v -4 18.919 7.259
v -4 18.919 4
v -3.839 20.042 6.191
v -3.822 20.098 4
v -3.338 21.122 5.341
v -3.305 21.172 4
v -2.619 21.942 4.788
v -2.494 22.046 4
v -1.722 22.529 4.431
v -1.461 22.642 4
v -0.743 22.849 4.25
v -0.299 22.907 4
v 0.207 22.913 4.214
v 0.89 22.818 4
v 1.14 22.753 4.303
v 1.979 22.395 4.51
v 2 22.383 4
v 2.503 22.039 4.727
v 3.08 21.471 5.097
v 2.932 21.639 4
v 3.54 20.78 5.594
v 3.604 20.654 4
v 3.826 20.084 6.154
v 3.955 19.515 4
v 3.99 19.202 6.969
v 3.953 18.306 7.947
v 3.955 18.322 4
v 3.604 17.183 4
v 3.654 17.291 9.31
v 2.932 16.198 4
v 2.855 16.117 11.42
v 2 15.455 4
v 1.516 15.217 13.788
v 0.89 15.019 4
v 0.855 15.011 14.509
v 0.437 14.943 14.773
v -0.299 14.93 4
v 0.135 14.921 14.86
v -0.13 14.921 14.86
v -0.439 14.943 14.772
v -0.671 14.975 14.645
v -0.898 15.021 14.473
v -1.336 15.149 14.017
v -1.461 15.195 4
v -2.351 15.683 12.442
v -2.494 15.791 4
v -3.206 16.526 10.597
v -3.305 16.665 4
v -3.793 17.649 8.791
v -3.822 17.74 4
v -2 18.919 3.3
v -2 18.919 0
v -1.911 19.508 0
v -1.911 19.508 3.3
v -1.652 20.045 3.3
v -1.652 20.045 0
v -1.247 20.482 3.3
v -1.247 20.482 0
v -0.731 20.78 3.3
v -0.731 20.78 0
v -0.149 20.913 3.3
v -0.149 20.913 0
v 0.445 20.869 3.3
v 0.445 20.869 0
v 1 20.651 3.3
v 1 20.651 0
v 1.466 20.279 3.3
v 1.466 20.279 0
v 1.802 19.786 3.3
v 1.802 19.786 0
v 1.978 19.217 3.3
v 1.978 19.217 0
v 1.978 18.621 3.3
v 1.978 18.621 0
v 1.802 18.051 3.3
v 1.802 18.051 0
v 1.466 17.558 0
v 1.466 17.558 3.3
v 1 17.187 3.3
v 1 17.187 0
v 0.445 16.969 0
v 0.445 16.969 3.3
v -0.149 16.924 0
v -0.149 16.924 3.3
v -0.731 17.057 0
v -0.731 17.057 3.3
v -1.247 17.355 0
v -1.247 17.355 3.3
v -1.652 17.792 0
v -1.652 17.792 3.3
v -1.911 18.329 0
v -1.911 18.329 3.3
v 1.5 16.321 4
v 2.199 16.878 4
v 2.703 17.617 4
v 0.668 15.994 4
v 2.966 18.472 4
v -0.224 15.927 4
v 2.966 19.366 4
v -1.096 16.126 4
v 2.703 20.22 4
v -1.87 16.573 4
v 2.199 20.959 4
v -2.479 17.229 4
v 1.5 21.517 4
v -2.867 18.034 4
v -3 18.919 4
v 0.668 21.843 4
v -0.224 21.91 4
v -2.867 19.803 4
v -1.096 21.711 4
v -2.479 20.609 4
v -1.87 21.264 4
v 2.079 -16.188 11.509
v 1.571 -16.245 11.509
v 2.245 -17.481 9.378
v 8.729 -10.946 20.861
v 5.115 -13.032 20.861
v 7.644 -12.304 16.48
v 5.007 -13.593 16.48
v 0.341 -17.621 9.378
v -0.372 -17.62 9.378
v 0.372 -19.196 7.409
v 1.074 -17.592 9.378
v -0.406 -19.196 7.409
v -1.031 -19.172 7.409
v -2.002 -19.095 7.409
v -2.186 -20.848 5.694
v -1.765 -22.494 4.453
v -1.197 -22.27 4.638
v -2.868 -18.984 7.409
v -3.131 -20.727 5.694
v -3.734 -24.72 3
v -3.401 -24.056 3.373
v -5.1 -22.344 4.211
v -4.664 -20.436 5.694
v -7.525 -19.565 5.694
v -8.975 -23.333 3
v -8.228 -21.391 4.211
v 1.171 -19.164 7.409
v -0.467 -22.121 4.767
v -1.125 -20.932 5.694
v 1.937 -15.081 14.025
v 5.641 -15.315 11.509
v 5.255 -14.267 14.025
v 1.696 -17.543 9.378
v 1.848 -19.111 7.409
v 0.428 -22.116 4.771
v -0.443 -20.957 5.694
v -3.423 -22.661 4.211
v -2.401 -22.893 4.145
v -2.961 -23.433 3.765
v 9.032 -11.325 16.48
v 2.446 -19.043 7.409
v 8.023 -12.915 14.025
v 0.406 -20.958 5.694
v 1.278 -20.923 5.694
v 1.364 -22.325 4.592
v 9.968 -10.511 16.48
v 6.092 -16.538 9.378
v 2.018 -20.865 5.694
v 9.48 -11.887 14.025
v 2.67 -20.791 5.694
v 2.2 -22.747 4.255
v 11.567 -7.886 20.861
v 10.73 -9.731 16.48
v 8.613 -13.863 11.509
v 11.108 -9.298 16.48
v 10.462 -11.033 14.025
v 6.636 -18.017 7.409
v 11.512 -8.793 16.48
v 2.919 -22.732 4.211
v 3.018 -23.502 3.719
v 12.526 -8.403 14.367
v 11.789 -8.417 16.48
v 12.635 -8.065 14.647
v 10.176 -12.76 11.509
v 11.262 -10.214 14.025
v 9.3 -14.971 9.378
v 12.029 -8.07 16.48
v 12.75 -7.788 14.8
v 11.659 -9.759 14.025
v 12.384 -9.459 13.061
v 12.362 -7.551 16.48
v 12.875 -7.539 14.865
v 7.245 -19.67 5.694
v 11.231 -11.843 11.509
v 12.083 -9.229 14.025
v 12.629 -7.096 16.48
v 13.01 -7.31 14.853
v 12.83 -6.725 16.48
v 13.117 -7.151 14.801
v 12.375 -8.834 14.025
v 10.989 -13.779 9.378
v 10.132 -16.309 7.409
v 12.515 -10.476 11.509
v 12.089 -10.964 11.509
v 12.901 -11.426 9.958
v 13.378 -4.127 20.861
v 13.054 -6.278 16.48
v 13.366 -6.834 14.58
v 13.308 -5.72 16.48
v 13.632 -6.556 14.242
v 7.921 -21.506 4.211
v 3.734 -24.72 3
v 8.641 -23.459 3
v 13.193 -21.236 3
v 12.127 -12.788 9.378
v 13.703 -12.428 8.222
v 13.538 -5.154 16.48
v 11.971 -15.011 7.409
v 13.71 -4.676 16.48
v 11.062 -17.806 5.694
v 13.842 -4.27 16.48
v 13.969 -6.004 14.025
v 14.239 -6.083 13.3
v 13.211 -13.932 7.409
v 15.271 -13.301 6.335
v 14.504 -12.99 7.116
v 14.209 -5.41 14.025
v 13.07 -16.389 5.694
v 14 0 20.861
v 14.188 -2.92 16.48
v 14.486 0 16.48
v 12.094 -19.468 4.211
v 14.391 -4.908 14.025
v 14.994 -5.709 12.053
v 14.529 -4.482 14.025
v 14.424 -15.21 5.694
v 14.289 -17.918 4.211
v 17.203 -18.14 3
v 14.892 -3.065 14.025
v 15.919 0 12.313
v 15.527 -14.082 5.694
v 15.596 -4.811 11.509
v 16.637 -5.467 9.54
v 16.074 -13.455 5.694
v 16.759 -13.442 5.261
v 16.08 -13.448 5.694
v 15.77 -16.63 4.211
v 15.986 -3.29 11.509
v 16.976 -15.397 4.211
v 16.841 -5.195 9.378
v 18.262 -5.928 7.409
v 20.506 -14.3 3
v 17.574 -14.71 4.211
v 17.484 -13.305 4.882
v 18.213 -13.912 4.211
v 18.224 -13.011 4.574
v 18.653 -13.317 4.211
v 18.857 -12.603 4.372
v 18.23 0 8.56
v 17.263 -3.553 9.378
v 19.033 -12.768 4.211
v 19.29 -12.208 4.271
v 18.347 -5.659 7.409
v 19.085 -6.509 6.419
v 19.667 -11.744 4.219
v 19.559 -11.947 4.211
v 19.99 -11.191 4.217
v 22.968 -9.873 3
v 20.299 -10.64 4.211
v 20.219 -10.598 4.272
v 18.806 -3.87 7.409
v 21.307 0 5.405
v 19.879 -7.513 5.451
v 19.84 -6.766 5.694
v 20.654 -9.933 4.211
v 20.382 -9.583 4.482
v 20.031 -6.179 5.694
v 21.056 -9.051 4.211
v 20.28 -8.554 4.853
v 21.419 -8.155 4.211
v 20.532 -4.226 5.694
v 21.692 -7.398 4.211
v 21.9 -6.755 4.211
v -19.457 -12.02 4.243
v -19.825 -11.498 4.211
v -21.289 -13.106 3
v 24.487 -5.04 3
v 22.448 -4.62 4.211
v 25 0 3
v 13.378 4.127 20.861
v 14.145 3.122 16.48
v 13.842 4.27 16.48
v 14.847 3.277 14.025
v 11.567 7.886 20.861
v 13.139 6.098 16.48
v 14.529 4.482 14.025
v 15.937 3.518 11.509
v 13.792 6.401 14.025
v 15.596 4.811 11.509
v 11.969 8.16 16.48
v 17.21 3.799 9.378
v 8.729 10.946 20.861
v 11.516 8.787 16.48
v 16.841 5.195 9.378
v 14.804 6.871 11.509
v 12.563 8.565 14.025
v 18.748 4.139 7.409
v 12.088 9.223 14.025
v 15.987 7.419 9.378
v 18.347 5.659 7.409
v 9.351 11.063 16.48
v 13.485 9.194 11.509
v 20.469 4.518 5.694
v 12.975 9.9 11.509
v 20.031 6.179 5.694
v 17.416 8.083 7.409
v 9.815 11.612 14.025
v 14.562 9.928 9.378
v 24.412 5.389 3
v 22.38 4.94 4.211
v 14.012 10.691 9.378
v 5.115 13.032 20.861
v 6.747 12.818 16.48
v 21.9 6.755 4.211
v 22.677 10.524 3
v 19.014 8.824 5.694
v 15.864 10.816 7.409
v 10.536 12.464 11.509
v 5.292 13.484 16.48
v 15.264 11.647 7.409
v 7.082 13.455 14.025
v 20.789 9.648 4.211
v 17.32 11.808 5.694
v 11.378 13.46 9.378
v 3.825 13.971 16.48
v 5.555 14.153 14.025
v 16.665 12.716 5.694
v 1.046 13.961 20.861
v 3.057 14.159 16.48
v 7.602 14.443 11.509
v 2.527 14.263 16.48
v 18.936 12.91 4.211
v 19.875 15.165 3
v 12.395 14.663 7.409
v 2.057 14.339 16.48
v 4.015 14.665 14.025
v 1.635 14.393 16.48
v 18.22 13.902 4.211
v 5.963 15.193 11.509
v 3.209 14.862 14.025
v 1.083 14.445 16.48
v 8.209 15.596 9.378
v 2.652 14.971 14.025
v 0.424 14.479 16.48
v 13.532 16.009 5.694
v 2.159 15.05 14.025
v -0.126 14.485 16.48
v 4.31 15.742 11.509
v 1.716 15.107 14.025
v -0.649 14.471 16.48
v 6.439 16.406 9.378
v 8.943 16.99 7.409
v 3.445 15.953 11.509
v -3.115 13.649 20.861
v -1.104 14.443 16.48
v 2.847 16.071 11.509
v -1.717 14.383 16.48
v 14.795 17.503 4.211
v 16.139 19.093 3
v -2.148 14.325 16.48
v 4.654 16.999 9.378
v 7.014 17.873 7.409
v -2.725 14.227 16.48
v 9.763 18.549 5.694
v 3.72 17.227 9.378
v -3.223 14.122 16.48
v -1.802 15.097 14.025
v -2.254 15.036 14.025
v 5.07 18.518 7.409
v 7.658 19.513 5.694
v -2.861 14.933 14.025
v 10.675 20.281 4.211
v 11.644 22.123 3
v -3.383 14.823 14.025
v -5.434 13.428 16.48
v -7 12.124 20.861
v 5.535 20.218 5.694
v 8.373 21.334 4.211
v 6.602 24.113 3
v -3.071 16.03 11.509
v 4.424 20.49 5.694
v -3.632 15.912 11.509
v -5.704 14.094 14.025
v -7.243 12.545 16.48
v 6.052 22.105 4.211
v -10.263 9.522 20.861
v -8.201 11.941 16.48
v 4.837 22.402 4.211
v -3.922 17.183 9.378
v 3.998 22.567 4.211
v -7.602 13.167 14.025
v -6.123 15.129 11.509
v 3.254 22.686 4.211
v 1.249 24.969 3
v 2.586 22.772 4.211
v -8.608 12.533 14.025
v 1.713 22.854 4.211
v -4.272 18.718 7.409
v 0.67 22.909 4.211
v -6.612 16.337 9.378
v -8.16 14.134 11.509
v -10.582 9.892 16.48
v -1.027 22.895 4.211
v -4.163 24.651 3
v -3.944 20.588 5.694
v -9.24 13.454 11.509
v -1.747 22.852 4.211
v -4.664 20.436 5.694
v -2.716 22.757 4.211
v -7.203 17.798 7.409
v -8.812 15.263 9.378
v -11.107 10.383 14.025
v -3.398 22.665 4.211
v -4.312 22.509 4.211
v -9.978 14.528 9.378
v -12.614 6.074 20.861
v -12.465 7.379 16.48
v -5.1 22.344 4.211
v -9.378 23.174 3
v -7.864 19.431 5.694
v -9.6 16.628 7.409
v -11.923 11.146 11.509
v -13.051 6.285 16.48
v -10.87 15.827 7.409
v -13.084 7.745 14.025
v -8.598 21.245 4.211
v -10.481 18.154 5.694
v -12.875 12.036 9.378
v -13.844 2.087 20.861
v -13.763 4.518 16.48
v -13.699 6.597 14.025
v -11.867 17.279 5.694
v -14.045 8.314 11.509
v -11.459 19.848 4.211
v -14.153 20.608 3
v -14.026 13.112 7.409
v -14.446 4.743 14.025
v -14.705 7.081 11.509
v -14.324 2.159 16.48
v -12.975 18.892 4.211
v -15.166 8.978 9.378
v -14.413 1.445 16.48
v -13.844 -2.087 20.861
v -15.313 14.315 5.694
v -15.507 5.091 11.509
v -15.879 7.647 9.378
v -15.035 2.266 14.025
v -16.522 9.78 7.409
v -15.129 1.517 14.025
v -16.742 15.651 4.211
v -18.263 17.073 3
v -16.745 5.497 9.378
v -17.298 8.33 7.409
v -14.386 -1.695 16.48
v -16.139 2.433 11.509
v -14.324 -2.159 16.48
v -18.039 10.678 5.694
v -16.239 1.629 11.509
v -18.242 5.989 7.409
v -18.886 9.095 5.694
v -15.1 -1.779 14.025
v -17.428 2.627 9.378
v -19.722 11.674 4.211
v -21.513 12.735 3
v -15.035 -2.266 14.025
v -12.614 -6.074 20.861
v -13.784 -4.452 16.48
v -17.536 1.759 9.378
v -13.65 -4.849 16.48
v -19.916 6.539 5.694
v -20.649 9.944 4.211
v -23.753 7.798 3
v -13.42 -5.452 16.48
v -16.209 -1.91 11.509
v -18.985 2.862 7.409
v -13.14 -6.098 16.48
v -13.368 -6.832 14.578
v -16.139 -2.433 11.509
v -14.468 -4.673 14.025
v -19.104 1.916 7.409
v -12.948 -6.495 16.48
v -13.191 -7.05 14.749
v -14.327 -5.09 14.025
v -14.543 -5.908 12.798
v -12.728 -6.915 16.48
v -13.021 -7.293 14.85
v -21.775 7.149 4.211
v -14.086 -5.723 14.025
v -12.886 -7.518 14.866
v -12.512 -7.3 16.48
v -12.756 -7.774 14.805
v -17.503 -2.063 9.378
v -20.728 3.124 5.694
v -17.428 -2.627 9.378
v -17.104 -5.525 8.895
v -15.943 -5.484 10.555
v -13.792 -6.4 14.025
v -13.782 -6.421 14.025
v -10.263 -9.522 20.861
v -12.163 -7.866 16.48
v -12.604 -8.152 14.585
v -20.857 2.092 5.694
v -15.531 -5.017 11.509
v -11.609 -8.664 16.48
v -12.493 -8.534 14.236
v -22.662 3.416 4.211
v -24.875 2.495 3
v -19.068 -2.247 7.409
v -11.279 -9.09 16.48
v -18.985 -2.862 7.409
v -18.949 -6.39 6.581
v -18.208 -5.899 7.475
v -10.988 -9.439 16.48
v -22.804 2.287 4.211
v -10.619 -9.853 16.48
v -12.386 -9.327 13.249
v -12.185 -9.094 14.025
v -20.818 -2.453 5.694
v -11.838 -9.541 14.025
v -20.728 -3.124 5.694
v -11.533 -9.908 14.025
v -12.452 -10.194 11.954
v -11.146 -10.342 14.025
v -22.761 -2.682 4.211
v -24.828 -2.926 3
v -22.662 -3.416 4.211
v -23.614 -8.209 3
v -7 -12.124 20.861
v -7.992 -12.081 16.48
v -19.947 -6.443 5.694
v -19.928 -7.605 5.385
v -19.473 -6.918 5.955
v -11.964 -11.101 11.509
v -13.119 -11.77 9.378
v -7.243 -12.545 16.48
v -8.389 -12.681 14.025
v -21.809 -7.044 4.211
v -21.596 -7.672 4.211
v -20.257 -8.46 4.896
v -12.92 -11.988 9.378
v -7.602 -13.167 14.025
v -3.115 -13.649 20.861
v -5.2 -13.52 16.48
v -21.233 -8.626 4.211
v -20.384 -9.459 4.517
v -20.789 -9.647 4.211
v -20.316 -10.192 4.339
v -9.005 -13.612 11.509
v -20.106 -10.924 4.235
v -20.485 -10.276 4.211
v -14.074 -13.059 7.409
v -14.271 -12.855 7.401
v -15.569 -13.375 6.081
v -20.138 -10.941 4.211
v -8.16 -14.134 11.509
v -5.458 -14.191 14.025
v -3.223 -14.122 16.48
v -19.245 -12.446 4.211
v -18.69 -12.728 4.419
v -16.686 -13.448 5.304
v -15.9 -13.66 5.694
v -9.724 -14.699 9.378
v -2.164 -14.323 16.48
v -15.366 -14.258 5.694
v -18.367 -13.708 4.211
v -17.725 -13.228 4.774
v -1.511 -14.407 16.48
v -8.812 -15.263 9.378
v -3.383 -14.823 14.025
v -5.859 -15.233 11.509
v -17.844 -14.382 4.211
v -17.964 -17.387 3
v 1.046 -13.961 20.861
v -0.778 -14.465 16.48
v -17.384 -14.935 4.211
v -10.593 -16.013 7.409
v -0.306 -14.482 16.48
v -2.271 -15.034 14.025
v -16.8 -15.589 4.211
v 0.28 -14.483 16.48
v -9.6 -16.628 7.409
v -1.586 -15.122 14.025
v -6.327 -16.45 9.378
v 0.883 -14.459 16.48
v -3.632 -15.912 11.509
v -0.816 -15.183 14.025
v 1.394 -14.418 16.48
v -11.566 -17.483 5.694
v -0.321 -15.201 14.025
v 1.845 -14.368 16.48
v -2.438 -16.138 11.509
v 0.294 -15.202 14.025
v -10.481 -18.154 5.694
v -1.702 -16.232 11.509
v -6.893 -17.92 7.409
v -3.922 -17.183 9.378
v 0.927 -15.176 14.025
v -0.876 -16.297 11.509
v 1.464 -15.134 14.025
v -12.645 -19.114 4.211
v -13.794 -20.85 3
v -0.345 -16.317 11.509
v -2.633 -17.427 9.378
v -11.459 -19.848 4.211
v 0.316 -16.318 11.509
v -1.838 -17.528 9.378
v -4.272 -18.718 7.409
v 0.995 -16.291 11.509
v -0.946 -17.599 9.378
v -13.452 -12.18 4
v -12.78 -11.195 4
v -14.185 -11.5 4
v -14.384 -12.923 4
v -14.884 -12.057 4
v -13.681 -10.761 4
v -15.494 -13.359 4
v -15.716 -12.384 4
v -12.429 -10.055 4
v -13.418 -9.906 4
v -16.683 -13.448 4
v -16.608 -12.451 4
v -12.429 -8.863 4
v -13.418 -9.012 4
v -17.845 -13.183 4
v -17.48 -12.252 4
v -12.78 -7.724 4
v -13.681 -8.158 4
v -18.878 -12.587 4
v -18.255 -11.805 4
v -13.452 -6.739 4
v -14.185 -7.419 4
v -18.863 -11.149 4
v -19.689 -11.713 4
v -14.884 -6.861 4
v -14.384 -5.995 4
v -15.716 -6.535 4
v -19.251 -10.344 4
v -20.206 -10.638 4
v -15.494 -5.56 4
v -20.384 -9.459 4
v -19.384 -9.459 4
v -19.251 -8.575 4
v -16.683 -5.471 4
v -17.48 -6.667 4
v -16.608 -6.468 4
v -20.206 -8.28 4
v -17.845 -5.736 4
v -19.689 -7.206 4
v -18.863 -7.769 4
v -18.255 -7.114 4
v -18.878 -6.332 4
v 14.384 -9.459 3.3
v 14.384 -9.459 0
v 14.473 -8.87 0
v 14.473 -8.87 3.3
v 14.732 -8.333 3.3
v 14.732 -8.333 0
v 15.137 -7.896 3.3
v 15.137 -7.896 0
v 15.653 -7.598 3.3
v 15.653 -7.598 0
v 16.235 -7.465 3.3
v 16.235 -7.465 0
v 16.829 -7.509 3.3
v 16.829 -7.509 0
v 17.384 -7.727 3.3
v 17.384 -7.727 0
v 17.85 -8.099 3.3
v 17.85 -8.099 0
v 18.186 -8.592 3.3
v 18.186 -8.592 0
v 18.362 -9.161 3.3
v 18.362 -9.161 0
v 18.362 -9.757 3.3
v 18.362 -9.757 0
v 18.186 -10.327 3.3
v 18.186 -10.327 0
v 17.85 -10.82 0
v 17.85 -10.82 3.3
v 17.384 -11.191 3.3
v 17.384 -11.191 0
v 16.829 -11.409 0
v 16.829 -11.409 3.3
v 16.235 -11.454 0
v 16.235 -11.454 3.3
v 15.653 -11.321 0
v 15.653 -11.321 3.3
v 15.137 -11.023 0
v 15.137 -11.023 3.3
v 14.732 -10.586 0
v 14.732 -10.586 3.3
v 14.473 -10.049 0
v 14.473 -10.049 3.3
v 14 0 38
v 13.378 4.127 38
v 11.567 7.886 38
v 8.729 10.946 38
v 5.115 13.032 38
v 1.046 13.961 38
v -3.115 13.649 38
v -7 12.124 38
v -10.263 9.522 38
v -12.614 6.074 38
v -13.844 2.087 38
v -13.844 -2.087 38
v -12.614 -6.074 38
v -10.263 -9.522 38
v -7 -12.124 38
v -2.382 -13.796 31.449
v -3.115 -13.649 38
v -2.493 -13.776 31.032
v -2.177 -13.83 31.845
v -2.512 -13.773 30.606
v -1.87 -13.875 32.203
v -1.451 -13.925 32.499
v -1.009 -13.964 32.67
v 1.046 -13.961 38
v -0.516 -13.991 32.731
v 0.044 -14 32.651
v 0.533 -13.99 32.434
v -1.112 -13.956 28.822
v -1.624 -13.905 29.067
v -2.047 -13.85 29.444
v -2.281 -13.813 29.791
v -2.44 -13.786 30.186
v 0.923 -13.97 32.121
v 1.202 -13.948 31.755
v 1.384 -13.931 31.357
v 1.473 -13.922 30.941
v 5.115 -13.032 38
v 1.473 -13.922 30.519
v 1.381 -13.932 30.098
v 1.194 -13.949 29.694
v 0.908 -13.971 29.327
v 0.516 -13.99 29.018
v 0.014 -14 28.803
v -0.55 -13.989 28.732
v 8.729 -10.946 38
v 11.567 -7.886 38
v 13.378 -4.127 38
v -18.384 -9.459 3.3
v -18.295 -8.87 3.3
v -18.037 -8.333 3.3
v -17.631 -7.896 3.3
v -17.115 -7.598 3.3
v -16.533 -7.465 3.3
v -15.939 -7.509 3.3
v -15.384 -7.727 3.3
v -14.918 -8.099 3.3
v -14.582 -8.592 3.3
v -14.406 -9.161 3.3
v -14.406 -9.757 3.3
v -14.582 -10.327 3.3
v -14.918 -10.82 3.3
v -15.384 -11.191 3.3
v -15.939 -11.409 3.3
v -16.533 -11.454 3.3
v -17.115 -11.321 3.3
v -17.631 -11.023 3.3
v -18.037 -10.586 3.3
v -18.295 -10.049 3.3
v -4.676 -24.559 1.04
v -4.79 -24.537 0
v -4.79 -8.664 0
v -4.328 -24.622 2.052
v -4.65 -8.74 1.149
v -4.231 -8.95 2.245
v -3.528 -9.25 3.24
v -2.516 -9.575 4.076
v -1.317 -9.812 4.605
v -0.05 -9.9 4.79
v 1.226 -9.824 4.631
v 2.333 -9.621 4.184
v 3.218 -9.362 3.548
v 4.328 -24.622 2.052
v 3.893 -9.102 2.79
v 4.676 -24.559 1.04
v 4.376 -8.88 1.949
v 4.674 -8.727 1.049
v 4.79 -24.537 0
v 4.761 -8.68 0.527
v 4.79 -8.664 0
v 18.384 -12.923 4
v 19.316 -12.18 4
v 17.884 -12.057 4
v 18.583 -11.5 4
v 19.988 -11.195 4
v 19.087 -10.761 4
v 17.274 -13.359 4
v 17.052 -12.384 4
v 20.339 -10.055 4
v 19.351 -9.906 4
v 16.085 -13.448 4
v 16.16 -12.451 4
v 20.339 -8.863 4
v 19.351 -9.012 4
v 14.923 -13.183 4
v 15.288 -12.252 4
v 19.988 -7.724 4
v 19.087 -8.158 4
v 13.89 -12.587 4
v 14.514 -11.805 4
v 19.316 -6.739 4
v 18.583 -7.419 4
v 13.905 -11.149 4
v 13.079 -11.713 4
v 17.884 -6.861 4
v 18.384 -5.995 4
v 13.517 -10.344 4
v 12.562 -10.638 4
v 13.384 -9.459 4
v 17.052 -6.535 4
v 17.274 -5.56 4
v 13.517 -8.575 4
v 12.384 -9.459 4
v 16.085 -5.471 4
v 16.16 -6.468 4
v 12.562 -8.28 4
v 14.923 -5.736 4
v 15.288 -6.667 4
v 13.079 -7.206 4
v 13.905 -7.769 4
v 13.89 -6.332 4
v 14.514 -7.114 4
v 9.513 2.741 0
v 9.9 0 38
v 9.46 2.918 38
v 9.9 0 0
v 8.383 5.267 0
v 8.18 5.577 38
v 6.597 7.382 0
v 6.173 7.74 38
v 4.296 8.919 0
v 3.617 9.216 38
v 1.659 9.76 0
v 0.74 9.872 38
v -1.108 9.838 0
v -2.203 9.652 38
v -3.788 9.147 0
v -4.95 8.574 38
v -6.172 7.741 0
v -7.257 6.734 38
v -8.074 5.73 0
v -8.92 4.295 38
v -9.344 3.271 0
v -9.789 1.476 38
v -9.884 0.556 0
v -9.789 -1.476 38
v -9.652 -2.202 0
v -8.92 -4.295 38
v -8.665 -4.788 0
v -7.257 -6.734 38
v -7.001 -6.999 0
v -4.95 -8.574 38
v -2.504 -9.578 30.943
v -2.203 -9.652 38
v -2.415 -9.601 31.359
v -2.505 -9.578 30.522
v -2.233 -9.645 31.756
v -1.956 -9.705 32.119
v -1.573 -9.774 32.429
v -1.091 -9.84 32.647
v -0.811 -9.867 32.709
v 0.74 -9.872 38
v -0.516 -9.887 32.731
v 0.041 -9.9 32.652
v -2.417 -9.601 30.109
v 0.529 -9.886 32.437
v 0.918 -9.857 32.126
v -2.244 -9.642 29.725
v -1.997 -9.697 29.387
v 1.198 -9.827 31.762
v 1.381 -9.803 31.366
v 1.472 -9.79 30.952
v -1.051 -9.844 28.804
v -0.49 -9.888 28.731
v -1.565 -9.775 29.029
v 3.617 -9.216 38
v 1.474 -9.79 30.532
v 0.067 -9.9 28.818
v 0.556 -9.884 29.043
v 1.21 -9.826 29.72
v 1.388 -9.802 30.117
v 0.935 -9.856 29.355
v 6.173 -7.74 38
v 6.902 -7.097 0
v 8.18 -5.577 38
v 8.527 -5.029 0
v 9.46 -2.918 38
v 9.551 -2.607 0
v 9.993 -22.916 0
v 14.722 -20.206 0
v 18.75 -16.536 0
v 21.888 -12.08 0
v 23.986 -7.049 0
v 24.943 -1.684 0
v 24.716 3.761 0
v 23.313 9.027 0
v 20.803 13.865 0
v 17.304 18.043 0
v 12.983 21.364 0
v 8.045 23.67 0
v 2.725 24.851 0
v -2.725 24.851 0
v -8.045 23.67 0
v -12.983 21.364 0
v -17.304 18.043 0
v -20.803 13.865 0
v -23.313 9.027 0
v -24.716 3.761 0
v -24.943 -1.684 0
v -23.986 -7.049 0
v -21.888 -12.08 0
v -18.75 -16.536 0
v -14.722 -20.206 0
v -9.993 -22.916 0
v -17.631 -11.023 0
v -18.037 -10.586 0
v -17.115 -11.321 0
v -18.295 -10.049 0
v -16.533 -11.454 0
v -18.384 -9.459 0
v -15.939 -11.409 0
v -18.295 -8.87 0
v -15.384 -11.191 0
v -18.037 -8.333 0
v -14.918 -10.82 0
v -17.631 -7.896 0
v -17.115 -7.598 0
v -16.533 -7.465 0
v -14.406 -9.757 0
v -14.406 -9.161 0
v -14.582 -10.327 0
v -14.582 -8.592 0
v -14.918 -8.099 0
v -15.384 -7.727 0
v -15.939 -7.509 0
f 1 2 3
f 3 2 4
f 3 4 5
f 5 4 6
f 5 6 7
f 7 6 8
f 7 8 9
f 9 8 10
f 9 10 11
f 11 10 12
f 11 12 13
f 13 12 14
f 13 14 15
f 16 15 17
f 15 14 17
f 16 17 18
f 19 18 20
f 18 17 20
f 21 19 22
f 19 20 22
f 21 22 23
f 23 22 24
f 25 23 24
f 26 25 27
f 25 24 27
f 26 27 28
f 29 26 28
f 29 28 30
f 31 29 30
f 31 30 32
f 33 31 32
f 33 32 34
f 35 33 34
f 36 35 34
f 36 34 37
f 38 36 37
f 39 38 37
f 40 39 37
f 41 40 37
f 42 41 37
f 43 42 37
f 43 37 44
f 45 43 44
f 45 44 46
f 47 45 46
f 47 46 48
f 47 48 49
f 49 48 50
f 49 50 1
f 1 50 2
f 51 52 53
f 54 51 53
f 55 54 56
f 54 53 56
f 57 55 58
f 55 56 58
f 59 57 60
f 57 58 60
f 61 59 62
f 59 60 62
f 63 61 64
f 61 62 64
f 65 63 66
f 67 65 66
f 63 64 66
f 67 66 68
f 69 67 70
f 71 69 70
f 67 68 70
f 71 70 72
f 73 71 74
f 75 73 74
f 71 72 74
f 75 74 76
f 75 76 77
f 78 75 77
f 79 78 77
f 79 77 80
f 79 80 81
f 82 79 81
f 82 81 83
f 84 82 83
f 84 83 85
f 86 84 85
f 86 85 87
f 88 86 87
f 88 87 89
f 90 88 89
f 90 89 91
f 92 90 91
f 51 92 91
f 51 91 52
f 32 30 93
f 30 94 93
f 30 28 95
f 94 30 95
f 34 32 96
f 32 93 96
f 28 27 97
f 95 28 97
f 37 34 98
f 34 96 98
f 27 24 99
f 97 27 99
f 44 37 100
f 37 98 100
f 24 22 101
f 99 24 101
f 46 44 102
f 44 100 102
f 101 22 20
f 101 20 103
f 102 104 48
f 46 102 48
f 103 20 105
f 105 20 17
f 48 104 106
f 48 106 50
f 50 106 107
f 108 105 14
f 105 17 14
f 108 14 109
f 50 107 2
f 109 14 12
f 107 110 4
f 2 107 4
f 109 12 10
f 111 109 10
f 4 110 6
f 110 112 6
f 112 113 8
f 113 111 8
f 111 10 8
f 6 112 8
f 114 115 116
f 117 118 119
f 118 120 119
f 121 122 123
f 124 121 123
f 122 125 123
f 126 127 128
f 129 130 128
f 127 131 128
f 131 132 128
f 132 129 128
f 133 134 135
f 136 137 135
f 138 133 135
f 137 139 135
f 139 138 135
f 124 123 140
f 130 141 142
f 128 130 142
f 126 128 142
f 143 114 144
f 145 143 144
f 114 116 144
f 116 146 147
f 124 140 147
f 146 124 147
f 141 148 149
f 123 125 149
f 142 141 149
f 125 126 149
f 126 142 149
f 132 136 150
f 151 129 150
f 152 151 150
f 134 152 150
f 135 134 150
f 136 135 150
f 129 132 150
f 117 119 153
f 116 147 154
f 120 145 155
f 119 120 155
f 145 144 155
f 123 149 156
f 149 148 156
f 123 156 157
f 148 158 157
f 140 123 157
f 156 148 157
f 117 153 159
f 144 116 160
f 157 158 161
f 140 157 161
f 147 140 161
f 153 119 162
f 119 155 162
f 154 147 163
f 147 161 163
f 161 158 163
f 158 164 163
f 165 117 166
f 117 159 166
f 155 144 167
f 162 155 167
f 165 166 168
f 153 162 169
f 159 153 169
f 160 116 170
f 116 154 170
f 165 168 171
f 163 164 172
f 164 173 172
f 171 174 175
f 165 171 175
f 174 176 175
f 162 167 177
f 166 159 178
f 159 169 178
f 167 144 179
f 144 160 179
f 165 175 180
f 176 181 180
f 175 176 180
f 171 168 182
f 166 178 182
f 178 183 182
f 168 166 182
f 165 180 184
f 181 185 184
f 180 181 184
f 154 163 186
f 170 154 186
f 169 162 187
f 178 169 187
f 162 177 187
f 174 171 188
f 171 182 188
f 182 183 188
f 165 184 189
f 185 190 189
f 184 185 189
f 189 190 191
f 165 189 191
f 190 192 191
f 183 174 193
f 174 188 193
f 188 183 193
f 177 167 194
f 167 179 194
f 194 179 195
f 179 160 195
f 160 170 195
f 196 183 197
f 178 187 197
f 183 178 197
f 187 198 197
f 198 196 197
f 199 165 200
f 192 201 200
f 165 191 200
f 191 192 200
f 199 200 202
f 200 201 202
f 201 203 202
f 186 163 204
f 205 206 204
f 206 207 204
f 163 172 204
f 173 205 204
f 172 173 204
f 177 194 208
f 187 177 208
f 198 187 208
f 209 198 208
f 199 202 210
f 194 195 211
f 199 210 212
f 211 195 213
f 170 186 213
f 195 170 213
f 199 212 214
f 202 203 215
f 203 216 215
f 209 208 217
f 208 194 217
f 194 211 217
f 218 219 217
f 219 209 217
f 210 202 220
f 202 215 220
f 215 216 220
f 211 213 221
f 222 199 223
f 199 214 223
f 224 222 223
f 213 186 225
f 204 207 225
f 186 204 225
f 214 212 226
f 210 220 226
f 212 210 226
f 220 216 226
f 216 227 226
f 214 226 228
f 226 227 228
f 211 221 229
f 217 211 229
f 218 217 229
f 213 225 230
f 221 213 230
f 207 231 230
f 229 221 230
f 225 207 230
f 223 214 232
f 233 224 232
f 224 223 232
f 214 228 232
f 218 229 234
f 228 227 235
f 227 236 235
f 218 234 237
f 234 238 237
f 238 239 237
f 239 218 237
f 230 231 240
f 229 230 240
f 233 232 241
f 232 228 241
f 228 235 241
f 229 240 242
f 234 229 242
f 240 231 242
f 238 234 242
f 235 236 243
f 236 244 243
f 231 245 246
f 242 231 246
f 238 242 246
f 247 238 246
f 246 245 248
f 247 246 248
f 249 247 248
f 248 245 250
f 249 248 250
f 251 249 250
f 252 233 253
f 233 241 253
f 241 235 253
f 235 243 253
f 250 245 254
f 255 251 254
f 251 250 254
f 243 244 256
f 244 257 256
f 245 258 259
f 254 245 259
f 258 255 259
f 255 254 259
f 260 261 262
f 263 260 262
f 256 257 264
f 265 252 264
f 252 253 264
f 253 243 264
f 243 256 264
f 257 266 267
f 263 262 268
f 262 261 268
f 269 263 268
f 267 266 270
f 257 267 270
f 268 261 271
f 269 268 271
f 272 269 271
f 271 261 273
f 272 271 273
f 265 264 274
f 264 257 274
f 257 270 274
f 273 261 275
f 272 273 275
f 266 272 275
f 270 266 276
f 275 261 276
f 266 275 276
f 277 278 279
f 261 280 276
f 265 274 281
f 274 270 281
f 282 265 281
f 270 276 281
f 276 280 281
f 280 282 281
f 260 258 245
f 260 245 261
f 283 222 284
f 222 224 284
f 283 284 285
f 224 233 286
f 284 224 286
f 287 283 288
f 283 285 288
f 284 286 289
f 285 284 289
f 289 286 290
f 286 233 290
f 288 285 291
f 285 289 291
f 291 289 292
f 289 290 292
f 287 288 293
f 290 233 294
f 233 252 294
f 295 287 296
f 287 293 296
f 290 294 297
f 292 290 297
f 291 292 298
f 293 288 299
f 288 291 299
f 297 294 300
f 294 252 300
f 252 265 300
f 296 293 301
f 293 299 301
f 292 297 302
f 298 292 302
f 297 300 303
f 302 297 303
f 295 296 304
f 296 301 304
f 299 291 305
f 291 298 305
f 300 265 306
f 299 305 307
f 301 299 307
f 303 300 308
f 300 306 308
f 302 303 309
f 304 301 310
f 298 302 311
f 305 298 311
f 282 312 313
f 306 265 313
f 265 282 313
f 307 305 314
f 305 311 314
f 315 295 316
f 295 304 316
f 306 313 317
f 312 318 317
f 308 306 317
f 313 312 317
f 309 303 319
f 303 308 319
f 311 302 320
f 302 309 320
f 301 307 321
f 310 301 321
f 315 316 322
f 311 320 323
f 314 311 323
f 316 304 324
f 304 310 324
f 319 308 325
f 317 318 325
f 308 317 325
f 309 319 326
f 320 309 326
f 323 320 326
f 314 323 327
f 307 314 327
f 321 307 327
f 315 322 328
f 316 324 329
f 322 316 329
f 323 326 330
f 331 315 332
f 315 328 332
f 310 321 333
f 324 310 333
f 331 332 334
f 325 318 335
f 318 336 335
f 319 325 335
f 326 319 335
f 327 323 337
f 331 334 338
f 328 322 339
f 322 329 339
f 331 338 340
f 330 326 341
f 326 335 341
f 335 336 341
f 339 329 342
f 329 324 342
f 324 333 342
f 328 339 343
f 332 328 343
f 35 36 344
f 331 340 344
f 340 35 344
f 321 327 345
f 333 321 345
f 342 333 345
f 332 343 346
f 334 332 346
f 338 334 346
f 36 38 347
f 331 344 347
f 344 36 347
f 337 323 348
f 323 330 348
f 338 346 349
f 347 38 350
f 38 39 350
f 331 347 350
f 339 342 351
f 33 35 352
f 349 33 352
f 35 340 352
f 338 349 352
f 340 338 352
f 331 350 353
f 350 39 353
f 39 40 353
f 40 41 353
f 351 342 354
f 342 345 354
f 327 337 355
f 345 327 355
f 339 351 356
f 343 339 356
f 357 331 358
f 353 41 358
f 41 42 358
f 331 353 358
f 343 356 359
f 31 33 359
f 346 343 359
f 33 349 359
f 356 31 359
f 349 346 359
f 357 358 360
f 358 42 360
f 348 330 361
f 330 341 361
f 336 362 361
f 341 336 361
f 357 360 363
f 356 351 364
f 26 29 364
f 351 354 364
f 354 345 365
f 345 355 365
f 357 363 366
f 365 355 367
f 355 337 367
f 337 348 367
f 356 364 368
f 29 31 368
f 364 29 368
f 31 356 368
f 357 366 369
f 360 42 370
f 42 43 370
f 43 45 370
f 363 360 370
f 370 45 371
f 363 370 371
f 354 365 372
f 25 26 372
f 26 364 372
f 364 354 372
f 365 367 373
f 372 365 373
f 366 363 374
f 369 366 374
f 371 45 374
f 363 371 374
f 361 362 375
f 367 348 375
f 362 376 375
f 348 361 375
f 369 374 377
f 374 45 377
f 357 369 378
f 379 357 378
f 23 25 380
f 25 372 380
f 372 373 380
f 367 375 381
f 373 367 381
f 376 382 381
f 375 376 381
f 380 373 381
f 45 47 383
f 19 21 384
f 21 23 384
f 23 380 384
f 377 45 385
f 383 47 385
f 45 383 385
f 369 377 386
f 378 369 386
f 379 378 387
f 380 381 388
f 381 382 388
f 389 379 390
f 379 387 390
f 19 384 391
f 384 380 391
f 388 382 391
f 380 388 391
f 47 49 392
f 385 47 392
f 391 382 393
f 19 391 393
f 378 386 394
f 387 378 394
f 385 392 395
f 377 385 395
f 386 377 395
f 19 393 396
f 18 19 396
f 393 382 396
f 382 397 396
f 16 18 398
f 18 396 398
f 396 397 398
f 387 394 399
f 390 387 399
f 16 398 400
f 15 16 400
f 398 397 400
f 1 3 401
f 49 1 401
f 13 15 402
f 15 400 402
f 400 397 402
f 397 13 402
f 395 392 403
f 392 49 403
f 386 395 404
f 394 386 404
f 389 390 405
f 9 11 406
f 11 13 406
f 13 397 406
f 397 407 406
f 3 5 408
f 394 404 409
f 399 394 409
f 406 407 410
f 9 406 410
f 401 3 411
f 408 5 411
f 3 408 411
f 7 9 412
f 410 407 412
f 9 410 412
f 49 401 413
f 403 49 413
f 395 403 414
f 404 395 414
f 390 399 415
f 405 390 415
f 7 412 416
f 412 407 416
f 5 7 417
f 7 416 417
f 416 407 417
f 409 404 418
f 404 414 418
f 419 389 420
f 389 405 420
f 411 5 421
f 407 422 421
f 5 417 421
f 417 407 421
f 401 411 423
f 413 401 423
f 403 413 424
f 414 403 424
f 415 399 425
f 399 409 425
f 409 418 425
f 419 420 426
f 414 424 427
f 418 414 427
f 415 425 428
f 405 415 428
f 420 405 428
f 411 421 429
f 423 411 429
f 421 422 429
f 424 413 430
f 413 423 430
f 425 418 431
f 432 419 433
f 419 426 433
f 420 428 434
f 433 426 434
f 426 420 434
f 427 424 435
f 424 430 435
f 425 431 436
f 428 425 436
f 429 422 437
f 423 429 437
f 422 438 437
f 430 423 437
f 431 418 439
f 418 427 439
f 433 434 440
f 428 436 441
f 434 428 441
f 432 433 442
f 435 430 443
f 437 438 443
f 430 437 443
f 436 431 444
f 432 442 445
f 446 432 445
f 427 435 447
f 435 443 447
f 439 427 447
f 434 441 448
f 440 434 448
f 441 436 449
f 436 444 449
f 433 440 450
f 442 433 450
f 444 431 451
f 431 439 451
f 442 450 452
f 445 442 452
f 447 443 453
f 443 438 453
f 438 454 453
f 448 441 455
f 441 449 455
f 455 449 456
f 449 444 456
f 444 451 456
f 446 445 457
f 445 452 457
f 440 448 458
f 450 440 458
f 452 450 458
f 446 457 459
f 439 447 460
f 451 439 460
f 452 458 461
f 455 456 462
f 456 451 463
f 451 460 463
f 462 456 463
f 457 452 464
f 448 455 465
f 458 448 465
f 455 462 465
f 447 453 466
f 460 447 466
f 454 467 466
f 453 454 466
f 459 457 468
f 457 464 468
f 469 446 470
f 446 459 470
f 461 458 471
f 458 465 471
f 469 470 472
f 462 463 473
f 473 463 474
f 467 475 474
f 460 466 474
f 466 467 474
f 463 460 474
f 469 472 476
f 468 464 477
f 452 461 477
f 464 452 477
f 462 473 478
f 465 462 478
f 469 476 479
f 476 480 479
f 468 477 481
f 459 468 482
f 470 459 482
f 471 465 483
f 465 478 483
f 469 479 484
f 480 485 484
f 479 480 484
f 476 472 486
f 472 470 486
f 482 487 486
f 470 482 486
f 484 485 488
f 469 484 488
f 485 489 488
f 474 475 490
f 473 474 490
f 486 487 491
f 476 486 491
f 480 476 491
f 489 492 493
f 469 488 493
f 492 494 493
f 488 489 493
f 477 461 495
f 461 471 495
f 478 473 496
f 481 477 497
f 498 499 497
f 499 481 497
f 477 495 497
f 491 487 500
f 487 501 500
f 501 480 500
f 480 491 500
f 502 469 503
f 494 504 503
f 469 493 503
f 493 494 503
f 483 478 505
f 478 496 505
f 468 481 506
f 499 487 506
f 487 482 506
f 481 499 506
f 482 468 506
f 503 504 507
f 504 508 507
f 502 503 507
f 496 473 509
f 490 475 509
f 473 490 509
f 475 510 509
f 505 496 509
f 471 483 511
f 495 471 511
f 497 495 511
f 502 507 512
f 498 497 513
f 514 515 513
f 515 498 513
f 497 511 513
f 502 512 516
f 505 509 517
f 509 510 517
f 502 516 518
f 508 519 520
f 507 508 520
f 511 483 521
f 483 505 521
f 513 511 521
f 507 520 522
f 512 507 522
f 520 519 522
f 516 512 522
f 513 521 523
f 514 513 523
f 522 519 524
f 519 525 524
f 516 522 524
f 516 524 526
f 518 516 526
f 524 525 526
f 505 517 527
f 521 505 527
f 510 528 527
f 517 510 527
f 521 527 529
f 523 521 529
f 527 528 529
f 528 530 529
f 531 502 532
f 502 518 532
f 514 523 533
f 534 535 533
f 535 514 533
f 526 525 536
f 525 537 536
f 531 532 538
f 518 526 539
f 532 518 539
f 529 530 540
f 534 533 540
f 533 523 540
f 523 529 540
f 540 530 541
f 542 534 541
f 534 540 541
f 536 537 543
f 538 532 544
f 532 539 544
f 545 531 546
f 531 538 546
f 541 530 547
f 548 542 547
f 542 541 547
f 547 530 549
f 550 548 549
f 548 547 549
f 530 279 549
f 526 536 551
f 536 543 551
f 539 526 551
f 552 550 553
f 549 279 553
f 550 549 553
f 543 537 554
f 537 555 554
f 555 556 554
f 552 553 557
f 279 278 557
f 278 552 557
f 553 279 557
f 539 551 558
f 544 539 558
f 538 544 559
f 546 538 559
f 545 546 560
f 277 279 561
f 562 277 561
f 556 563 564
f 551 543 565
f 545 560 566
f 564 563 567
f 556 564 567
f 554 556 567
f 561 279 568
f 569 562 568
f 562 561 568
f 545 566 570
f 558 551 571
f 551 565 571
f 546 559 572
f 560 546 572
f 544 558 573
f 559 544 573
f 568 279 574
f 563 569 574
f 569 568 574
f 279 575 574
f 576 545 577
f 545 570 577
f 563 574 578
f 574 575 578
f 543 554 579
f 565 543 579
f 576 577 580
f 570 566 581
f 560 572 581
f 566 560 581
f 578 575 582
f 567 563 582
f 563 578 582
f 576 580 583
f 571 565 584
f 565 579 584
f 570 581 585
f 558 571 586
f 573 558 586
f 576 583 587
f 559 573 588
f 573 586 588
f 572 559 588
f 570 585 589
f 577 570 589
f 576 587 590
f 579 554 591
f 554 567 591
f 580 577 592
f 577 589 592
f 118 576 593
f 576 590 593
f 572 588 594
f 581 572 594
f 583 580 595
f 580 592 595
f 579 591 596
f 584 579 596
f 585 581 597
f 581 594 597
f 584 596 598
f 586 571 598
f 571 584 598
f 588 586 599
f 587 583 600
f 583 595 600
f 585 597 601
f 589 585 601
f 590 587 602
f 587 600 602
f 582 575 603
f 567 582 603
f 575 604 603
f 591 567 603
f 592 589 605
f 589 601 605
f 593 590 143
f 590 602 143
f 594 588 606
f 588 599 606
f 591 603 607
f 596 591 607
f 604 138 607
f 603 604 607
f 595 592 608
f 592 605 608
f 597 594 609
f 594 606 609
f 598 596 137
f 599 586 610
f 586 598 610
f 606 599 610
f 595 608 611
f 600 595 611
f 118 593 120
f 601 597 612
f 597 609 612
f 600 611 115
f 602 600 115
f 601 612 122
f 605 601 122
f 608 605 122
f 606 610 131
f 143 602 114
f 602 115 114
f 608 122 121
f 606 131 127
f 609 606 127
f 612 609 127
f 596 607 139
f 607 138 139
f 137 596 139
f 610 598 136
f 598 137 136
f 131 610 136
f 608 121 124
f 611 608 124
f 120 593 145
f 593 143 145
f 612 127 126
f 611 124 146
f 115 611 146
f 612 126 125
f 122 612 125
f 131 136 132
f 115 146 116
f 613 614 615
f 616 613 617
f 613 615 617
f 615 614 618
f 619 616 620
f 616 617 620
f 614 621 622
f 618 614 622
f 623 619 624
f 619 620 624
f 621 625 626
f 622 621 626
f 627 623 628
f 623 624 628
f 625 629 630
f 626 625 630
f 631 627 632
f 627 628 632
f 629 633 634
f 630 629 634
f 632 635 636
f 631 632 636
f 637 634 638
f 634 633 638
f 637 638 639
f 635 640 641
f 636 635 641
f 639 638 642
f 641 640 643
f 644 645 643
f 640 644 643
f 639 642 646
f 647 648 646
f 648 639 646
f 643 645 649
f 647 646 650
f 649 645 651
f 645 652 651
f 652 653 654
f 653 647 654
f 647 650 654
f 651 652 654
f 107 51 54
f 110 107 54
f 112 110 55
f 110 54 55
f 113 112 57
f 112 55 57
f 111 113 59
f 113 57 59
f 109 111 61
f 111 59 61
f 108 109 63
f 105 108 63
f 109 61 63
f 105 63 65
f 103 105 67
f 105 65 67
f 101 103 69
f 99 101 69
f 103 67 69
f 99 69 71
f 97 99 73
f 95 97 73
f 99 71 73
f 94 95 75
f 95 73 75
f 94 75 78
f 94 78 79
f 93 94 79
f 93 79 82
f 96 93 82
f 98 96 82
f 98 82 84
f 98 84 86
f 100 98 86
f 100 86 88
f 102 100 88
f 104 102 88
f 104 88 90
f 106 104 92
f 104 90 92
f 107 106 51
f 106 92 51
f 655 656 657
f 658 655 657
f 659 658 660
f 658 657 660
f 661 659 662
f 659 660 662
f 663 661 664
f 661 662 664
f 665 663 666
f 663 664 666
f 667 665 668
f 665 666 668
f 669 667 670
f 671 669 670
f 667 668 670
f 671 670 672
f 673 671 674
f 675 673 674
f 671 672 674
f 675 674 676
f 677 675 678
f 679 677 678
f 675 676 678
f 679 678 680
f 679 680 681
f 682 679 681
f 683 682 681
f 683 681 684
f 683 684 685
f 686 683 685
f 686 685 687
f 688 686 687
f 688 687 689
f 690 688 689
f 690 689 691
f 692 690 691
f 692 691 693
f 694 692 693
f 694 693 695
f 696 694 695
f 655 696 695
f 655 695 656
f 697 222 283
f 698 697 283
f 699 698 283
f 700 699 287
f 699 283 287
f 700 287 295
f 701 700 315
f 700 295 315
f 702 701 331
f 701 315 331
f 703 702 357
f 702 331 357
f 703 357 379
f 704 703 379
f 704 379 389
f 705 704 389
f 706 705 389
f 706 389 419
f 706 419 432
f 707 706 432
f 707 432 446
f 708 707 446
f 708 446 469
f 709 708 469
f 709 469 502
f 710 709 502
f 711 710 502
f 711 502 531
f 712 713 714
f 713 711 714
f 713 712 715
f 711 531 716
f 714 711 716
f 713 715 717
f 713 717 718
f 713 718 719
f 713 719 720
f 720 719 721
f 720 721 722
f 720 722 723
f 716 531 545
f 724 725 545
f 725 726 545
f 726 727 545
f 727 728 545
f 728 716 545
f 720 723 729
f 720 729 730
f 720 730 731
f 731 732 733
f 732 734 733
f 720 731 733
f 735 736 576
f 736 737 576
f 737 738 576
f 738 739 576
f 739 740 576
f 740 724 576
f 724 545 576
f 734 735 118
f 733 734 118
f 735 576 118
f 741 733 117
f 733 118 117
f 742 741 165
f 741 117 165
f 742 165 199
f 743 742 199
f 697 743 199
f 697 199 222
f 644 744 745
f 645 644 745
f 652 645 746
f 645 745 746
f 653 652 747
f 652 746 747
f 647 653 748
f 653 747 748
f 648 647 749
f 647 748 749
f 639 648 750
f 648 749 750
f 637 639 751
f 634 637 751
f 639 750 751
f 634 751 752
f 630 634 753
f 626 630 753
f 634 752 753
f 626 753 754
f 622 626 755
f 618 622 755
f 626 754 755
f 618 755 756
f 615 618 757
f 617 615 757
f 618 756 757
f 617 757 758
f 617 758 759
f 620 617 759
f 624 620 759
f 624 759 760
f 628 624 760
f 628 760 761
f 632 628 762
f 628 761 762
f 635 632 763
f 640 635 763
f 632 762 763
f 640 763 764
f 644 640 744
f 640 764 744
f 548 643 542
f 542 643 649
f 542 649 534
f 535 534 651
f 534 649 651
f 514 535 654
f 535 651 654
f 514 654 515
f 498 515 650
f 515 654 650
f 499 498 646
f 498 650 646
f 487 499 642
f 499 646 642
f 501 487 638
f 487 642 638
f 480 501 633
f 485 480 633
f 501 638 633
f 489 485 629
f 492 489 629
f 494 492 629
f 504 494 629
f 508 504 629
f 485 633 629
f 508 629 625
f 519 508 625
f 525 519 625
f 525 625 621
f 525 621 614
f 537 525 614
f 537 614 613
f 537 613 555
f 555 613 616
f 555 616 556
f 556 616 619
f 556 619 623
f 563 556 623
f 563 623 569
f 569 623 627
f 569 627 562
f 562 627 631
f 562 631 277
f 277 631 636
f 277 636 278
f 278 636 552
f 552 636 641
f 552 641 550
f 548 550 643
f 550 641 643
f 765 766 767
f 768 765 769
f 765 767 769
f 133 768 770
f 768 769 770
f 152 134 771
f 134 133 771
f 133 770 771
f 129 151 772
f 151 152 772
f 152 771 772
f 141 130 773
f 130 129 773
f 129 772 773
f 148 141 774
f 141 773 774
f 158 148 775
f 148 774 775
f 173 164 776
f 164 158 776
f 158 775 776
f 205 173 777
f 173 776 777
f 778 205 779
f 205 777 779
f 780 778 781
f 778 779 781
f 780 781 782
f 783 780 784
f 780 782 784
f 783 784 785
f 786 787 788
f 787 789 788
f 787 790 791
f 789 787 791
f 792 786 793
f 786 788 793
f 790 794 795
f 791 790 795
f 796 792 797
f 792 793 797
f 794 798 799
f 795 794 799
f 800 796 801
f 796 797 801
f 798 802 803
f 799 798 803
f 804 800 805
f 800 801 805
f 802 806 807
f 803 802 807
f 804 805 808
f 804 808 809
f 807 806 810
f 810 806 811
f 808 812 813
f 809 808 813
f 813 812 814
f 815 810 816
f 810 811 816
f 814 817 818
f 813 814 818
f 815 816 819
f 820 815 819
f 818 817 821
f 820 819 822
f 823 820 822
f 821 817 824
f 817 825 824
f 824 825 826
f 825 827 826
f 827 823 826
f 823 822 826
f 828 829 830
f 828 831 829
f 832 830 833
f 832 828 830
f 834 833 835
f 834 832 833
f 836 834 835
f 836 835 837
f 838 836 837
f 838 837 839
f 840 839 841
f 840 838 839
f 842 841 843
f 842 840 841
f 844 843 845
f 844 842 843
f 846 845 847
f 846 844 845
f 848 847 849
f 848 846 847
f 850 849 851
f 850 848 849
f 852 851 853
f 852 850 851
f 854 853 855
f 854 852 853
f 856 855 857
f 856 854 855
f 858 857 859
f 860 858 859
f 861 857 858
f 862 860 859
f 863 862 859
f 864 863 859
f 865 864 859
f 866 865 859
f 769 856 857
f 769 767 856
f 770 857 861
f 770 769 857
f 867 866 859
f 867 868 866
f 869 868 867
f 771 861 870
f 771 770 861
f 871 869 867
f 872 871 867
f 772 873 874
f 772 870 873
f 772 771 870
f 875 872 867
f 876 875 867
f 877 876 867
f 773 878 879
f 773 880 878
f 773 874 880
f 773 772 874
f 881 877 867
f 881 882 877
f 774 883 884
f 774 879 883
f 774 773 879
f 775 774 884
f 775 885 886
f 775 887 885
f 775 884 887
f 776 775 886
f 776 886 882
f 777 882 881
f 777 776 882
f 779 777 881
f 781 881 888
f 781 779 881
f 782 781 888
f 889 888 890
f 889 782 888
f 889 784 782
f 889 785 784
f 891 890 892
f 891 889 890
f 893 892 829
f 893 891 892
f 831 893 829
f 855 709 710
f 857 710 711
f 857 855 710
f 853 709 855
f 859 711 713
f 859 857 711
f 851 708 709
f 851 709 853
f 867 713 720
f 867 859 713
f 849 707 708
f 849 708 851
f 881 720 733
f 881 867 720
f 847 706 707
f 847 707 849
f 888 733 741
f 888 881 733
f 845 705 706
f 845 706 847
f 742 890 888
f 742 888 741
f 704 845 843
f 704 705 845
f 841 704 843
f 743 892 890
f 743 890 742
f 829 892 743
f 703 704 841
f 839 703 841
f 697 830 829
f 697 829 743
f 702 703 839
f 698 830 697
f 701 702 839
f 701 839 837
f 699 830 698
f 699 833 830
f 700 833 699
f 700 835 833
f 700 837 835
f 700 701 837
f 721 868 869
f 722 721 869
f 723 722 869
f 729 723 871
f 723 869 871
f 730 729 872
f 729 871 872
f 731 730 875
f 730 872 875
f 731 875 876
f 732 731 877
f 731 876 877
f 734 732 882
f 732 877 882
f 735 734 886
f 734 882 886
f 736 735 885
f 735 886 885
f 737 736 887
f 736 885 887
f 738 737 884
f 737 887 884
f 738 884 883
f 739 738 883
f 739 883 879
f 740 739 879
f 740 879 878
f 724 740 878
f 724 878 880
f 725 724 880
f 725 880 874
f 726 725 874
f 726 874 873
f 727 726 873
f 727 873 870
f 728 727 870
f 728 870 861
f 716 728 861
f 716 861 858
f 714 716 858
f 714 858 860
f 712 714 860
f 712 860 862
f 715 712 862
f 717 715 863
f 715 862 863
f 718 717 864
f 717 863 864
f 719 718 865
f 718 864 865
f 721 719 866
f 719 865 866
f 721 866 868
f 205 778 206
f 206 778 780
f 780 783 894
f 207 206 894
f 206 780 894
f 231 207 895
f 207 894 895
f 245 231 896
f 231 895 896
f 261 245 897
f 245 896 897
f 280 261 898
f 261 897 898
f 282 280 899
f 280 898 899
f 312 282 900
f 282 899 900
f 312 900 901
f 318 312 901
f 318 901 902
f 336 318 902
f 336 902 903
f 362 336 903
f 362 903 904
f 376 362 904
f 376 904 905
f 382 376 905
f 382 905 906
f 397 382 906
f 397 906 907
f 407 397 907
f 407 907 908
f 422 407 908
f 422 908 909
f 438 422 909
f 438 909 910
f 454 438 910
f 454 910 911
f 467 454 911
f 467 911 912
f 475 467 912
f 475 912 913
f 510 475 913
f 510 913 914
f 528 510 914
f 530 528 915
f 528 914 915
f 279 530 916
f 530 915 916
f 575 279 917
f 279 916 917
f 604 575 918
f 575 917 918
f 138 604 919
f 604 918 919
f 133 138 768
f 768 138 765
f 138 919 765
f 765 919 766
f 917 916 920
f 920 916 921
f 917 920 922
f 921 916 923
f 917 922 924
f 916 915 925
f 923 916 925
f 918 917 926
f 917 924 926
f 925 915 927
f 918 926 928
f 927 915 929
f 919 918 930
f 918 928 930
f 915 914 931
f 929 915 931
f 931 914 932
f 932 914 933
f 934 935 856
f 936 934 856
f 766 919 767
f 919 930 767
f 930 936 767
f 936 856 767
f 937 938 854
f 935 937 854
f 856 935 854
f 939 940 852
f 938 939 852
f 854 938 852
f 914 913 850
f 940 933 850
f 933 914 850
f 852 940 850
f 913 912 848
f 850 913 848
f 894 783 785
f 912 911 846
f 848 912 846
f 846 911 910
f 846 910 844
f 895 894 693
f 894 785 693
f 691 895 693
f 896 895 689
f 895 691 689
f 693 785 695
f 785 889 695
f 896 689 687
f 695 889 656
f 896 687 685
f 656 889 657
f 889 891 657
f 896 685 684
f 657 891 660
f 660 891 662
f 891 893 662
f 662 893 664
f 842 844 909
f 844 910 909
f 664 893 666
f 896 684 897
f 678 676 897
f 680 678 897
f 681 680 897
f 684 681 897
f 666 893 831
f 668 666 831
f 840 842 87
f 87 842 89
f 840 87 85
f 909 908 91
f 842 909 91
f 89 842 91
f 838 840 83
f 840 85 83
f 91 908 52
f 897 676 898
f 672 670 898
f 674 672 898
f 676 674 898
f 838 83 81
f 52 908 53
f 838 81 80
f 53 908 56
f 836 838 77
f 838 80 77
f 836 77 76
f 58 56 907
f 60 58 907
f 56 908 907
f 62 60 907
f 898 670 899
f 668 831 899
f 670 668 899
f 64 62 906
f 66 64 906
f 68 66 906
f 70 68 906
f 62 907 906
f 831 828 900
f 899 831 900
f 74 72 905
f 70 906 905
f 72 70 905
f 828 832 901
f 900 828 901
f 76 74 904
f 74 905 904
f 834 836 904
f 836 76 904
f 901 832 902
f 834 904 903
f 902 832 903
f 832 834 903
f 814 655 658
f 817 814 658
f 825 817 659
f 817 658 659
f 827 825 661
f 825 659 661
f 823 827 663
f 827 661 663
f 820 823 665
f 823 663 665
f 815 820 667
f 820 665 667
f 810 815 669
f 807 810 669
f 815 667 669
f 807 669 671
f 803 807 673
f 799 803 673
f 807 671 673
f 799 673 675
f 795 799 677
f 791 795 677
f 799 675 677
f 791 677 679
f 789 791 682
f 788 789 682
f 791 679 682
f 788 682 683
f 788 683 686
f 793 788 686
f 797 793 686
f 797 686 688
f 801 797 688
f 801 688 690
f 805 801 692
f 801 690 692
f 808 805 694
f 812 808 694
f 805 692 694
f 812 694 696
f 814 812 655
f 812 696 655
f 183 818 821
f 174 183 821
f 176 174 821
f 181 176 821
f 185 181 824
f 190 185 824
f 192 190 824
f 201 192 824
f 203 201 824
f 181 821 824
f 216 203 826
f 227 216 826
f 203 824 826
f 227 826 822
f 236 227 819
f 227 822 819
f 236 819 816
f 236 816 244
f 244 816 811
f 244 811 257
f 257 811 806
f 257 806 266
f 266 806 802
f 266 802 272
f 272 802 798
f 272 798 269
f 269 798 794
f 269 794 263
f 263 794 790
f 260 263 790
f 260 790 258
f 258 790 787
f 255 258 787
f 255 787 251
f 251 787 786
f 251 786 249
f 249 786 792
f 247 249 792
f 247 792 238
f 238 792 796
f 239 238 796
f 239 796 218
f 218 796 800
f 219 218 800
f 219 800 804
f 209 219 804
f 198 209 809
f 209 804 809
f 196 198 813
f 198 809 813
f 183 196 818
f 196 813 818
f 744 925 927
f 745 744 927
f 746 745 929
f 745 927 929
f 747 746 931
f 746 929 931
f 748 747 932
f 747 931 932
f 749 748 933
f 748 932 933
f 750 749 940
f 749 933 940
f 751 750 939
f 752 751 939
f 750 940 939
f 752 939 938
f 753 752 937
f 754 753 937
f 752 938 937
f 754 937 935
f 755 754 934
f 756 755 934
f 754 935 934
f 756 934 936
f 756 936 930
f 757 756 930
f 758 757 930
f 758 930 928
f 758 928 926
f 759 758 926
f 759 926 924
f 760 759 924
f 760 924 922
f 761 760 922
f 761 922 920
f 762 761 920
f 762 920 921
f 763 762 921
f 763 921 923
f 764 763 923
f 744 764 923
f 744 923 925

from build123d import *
from OCP.BRepFilletAPI import BRepFilletAPI_MakeChamfer

# Parameters (mm, degrees)
SKETCH1_R           = 25
SKETCH1_R_2         = 14
SKETCH1_R_3         = 9.9
BOSS_EXTRUDE1_DEPTH = 3
SKETCH2_R           = 14
SKETCH2_R_2         = 9.9
BOSS_EXTRUDE2_DEPTH = 35
FILLET1_R           = 20
SKETCH3_R           = 2
CUT_EXTRUDE1_DEPTH  = 35
CUT_EXTRUDE2_START  = -4
SKETCH4_R           = 4
CUT_EXTRUDE2_DEPTH  = 18
CHAMFER1_SIZE       = 1
CHAMFER1_SIZE2      = 0.700207538
CUT_EXTRUDE3_REACH  = 53.904
SKETCH5_R           = 2
SKETCH5_R_2         = 4.790081367


with BuildPart() as part:
    # Sketch1 → Boss-Extrude1 (new body)
    # profile 1 of 2: a face of its own
    with BuildSketch(Plane.XY):
        Circle(SKETCH1_R)
        Circle(SKETCH1_R_2, mode=Mode.SUBTRACT)
    # profile 2 of 2: a face of its own
    with BuildSketch(Plane.XY):
        Circle(SKETCH1_R_2)
        Circle(SKETCH1_R_3, mode=Mode.SUBTRACT)
    extrude(amount=BOSS_EXTRUDE1_DEPTH)

    # Sketch2 → Boss-Extrude2 (add)
    with BuildSketch(Plane.XY.offset(3)):
        Circle(SKETCH2_R)
        Circle(SKETCH2_R_2, mode=Mode.SUBTRACT)
    extrude(amount=BOSS_EXTRUDE2_DEPTH)

    # Fillet1
    # the kernel refuses this fillet: 20 mm, written as the material it adds along each edge
    with BuildSketch(Plane(origin=(0, 0, 3), x_dir=(1, 0, 0), z_dir=(0, -1, 0))) as fillet1_piece_1:
        with BuildLine():
            CenterArc((34, 17.860571099), FILLET1_R, 180, 63.25631605)
            Line((14, 17.860571099), (13.6, 17.860571099))
            Line((13.6, 17.860571099), (13.6, 0))
            Line((13.6, 0), (14, -0.4))
            ThreePointArc((14, -0.4), (19.5, -0.4), (24.82, -0.357211422))
            Line((24.82, -0.357211422), (25, 0))
        make_face()
    revolve(axis=Axis((0, 0, 3), (0, 0, 1)))

    # Sketch3 → Cut-Extrude1 (cut)
    with BuildSketch(Plane(origin=(0, 0, 0), x_dir=(-1, 0, 0), z_dir=(0, 0, -1))):
        with Locations((0, 18.918658527)):
            Circle(SKETCH3_R)
        with Locations((16.38403889, -9.459329263)):
            Circle(SKETCH3_R)
        with Locations((-16.38403889, -9.459329263)):
            Circle(SKETCH3_R)
    extrude(amount=-CUT_EXTRUDE1_DEPTH, mode=Mode.SUBTRACT)

    # Sketch4 → Cut-Extrude2 (cut)
    with BuildSketch(Plane(origin=(0, 0, 0), x_dir=(-1, 0, 0), z_dir=(0, 0, -1)).offset(CUT_EXTRUDE2_START)):
        with Locations((-16.38403889, -9.459329263)):
            Circle(SKETCH4_R)
        with Locations((0, 18.918658527)):
            Circle(SKETCH4_R)
        with Locations((16.38403889, -9.459329263)):
            Circle(SKETCH4_R)
    extrude(amount=-CUT_EXTRUDE2_DEPTH, mode=Mode.SUBTRACT)

    # Chamfer1: one chamfer whose edges measure the first distance from different faces: ONE call of the kernel's chamfer builder (chamfer() names one face for all edges)
    chamfer1_edges_1 = [part.edges().sort_by_distance(p)[0] for p in [
        (18.38403889, -9.459329263, 4),
    ]]
    chamfer1_side_1 = [part.faces().sort_by_distance(p)[0] for p in [
        (20.270901805, -9.459329263, 4),
    ]]
    chamfer1_edges_2 = [part.edges().sort_by_distance(p)[0] for p in [
        (2, 18.918658527, 4),
    ]]
    chamfer1_side_2 = [part.faces().sort_by_distance(p)[0] for p in [
        (3.886862915, 18.918658527, 4),
    ]]
    chamfer1_edges_3 = [part.edges().sort_by_distance(p)[0] for p in [
        (-14.38403889, -9.459329263, 4),
    ]]
    chamfer1_side_3 = [part.faces().sort_by_distance(p)[0] for p in [
        (-12.497175975, -9.459329263, 4),
    ]]
    chamfer1 = BRepFilletAPI_MakeChamfer(part.part.solid().wrapped)
    for e in chamfer1_edges_1:
        chamfer1.Add(CHAMFER1_SIZE, CHAMFER1_SIZE2, e.wrapped, chamfer1_side_1[0].wrapped)  # the first distance lies on this face
    for e in chamfer1_edges_2:
        chamfer1.Add(CHAMFER1_SIZE, CHAMFER1_SIZE2, e.wrapped, chamfer1_side_2[0].wrapped)  # the first distance lies on this face
    for e in chamfer1_edges_3:
        chamfer1.Add(CHAMFER1_SIZE, CHAMFER1_SIZE2, e.wrapped, chamfer1_side_3[0].wrapped)  # the first distance lies on this face
    add(Compound.cast(chamfer1.Shape()), mode=Mode.REPLACE)

    # Sketch5 → Cut-Extrude3 (cut, up to next)
    with BuildSketch(Plane(origin=(0, 0, 0), x_dir=(1, 0, 0), z_dir=(0, 1, 0)), mode=Mode.PRIVATE) as cut_extrude3_sk1:
        with Locations(Location((-0.515660085, -30.731266932, 0), (0, 0, 270))):
            Circle(SKETCH5_R)
    cut_extrude3_tool1 = extrude(cut_extrude3_sk1.sketch, amount=-CUT_EXTRUDE3_REACH, mode=Mode.PRIVATE) & part.part
    # Sketch5 → Cut-Extrude3 (cut, up to next)
    with BuildSketch(Plane(origin=(0, 0, 0), x_dir=(1, 0, 0), z_dir=(0, 1, 0)), mode=Mode.PRIVATE) as cut_extrude3_sk2:
        Circle(SKETCH5_R_2)
    cut_extrude3_tool2 = extrude(cut_extrude3_sk2.sketch, amount=-CUT_EXTRUDE3_REACH, mode=Mode.PRIVATE) & part.part
    add(cut_extrude3_tool1.solids().sort_by_distance((-0.51566, 0, 30.731267))[0], mode=Mode.SUBTRACT)
    add(cut_extrude3_tool2.solids().sort_by_distance((0, 0, 0))[0], mode=Mode.SUBTRACT)


solid = part.part
